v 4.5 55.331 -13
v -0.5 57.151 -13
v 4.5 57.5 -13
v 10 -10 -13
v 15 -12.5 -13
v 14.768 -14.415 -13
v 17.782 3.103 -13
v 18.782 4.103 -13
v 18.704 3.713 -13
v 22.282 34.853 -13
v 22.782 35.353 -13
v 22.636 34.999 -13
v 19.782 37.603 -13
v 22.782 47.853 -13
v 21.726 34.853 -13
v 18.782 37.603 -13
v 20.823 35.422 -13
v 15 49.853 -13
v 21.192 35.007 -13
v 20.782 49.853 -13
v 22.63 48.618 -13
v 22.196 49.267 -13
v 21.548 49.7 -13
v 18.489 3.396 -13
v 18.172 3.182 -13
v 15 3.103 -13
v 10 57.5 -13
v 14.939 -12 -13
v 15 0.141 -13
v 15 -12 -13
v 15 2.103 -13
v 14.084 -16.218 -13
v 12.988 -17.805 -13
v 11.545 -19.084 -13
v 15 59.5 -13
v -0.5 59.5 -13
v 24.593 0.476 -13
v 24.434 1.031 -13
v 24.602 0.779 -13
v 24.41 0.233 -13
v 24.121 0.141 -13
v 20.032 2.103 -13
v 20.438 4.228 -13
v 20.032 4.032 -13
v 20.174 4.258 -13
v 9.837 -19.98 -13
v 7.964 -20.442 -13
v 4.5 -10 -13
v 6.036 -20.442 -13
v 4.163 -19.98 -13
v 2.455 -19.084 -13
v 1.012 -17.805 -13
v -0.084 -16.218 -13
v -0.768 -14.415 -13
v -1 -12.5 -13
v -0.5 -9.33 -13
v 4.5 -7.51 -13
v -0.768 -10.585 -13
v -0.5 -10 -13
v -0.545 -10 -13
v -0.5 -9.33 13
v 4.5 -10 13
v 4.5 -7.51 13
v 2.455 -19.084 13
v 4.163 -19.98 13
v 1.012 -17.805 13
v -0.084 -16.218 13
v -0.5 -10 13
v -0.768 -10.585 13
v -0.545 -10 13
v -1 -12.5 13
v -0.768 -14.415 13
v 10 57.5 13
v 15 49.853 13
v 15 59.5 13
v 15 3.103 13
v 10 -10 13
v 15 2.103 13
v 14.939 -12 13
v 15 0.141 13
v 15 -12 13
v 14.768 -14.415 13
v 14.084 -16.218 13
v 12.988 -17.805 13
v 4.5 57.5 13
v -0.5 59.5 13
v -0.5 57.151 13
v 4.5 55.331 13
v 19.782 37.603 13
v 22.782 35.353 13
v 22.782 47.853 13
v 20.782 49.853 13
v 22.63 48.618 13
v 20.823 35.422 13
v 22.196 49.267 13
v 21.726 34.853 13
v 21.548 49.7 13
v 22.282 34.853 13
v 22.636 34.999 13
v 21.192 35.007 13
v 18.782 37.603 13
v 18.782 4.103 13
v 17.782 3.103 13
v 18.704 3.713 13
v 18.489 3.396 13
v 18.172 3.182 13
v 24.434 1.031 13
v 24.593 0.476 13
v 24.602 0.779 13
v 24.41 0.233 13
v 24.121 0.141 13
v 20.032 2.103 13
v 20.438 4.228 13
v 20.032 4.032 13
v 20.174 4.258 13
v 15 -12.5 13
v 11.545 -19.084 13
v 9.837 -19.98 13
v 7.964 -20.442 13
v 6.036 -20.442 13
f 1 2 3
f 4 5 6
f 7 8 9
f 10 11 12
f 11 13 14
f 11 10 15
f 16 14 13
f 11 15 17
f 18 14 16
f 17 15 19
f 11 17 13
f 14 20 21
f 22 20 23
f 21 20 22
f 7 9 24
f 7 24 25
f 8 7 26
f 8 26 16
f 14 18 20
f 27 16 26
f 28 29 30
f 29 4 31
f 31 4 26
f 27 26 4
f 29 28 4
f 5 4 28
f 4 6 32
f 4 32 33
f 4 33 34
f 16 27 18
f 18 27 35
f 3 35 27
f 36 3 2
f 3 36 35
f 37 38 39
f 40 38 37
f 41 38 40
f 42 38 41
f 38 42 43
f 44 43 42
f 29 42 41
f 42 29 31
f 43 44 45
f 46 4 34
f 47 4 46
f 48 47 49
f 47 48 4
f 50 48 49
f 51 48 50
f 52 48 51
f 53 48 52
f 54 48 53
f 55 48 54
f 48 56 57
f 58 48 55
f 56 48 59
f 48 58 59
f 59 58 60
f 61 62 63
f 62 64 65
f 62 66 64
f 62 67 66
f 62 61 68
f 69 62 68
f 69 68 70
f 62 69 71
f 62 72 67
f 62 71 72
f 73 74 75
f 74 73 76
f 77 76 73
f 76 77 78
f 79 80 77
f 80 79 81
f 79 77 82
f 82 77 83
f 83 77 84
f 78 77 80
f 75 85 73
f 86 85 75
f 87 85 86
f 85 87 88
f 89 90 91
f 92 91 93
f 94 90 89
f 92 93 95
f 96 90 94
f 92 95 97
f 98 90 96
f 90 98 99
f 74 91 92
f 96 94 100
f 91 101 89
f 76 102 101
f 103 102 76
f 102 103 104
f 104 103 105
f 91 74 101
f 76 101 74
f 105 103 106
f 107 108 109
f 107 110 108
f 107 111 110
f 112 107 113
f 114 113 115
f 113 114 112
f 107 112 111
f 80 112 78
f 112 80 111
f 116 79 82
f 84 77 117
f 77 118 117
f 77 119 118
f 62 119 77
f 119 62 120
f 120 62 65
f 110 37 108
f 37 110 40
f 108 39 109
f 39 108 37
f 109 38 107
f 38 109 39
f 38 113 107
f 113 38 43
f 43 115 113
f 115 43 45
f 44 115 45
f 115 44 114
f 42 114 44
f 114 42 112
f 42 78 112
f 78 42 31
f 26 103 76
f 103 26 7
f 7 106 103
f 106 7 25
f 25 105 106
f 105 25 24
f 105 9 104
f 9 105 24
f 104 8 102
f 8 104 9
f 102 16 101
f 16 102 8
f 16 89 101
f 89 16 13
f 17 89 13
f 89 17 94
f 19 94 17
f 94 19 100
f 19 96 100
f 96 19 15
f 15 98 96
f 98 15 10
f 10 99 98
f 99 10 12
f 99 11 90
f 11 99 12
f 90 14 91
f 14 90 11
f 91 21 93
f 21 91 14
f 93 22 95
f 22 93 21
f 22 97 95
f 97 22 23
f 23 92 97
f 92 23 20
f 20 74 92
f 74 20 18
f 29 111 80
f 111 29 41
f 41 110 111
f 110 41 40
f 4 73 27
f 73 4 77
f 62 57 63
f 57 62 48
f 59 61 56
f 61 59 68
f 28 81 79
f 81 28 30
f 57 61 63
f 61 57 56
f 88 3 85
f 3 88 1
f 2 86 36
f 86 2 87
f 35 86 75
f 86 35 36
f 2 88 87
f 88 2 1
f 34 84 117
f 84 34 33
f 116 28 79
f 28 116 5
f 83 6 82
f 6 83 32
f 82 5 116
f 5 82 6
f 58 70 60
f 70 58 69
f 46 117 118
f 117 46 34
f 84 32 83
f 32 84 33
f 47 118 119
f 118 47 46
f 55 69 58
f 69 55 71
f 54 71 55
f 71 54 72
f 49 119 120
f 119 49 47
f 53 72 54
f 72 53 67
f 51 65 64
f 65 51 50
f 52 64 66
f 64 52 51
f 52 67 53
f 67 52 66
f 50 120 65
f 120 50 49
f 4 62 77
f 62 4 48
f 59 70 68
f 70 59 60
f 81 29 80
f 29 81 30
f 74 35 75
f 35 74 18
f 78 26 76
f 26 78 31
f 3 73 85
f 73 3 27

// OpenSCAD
CLIP_H = 26;


module din_clip() {
	
	difference() {

		linear_extrude(height=CLIP_H, center=true, convexity=5) {
			import(file="din_clip_02.dxf", layer="0", $fn=64);
		}
}
}

module interfacetoadapter()
{
//base plate
translate([10,-10,-CLIP_H/2])
cube([5,67.5,CLIP_H]);


//lower clip **********
//5mm up
translate([4.5,-12,-CLIP_H/2])
cube([10.5,2,CLIP_H]);

difference(){
//5mm up around corner
translate([-.5,-12,-CLIP_H/2])
cube([5,8,CLIP_H]);

//cut corner
translate([-6.5,-3,-CLIP_H/2])
rotate([0,0,-70])
cube([8,12,CLIP_H]);
}



//higher clip **********
//5mm up
translate([4.5,57.5,-CLIP_H/2])
cube([10.5,2,CLIP_H]);

difference(){
//5mm up around corner
translate([-.5,51.5,-CLIP_H/2])
cube([5,8,CLIP_H]);

//cut corner
translate([4,47,-CLIP_H/2])
rotate([0,0,70])
cube([8,20,CLIP_H]);

}


//extra hang support 
difference(){
translate([7,-12.5,-CLIP_H/2])
cylinder(h=CLIP_H, r1=8,r2=8);
translate([-5,-10,-CLIP_H/2])
cube([20,10,CLIP_H]);
}



}



difference(){
din_clip();
//base plate
translate([0,0,-CLIP_H/2])
cube([10,66.5,CLIP_H]);

}



interfacetoadapter();
